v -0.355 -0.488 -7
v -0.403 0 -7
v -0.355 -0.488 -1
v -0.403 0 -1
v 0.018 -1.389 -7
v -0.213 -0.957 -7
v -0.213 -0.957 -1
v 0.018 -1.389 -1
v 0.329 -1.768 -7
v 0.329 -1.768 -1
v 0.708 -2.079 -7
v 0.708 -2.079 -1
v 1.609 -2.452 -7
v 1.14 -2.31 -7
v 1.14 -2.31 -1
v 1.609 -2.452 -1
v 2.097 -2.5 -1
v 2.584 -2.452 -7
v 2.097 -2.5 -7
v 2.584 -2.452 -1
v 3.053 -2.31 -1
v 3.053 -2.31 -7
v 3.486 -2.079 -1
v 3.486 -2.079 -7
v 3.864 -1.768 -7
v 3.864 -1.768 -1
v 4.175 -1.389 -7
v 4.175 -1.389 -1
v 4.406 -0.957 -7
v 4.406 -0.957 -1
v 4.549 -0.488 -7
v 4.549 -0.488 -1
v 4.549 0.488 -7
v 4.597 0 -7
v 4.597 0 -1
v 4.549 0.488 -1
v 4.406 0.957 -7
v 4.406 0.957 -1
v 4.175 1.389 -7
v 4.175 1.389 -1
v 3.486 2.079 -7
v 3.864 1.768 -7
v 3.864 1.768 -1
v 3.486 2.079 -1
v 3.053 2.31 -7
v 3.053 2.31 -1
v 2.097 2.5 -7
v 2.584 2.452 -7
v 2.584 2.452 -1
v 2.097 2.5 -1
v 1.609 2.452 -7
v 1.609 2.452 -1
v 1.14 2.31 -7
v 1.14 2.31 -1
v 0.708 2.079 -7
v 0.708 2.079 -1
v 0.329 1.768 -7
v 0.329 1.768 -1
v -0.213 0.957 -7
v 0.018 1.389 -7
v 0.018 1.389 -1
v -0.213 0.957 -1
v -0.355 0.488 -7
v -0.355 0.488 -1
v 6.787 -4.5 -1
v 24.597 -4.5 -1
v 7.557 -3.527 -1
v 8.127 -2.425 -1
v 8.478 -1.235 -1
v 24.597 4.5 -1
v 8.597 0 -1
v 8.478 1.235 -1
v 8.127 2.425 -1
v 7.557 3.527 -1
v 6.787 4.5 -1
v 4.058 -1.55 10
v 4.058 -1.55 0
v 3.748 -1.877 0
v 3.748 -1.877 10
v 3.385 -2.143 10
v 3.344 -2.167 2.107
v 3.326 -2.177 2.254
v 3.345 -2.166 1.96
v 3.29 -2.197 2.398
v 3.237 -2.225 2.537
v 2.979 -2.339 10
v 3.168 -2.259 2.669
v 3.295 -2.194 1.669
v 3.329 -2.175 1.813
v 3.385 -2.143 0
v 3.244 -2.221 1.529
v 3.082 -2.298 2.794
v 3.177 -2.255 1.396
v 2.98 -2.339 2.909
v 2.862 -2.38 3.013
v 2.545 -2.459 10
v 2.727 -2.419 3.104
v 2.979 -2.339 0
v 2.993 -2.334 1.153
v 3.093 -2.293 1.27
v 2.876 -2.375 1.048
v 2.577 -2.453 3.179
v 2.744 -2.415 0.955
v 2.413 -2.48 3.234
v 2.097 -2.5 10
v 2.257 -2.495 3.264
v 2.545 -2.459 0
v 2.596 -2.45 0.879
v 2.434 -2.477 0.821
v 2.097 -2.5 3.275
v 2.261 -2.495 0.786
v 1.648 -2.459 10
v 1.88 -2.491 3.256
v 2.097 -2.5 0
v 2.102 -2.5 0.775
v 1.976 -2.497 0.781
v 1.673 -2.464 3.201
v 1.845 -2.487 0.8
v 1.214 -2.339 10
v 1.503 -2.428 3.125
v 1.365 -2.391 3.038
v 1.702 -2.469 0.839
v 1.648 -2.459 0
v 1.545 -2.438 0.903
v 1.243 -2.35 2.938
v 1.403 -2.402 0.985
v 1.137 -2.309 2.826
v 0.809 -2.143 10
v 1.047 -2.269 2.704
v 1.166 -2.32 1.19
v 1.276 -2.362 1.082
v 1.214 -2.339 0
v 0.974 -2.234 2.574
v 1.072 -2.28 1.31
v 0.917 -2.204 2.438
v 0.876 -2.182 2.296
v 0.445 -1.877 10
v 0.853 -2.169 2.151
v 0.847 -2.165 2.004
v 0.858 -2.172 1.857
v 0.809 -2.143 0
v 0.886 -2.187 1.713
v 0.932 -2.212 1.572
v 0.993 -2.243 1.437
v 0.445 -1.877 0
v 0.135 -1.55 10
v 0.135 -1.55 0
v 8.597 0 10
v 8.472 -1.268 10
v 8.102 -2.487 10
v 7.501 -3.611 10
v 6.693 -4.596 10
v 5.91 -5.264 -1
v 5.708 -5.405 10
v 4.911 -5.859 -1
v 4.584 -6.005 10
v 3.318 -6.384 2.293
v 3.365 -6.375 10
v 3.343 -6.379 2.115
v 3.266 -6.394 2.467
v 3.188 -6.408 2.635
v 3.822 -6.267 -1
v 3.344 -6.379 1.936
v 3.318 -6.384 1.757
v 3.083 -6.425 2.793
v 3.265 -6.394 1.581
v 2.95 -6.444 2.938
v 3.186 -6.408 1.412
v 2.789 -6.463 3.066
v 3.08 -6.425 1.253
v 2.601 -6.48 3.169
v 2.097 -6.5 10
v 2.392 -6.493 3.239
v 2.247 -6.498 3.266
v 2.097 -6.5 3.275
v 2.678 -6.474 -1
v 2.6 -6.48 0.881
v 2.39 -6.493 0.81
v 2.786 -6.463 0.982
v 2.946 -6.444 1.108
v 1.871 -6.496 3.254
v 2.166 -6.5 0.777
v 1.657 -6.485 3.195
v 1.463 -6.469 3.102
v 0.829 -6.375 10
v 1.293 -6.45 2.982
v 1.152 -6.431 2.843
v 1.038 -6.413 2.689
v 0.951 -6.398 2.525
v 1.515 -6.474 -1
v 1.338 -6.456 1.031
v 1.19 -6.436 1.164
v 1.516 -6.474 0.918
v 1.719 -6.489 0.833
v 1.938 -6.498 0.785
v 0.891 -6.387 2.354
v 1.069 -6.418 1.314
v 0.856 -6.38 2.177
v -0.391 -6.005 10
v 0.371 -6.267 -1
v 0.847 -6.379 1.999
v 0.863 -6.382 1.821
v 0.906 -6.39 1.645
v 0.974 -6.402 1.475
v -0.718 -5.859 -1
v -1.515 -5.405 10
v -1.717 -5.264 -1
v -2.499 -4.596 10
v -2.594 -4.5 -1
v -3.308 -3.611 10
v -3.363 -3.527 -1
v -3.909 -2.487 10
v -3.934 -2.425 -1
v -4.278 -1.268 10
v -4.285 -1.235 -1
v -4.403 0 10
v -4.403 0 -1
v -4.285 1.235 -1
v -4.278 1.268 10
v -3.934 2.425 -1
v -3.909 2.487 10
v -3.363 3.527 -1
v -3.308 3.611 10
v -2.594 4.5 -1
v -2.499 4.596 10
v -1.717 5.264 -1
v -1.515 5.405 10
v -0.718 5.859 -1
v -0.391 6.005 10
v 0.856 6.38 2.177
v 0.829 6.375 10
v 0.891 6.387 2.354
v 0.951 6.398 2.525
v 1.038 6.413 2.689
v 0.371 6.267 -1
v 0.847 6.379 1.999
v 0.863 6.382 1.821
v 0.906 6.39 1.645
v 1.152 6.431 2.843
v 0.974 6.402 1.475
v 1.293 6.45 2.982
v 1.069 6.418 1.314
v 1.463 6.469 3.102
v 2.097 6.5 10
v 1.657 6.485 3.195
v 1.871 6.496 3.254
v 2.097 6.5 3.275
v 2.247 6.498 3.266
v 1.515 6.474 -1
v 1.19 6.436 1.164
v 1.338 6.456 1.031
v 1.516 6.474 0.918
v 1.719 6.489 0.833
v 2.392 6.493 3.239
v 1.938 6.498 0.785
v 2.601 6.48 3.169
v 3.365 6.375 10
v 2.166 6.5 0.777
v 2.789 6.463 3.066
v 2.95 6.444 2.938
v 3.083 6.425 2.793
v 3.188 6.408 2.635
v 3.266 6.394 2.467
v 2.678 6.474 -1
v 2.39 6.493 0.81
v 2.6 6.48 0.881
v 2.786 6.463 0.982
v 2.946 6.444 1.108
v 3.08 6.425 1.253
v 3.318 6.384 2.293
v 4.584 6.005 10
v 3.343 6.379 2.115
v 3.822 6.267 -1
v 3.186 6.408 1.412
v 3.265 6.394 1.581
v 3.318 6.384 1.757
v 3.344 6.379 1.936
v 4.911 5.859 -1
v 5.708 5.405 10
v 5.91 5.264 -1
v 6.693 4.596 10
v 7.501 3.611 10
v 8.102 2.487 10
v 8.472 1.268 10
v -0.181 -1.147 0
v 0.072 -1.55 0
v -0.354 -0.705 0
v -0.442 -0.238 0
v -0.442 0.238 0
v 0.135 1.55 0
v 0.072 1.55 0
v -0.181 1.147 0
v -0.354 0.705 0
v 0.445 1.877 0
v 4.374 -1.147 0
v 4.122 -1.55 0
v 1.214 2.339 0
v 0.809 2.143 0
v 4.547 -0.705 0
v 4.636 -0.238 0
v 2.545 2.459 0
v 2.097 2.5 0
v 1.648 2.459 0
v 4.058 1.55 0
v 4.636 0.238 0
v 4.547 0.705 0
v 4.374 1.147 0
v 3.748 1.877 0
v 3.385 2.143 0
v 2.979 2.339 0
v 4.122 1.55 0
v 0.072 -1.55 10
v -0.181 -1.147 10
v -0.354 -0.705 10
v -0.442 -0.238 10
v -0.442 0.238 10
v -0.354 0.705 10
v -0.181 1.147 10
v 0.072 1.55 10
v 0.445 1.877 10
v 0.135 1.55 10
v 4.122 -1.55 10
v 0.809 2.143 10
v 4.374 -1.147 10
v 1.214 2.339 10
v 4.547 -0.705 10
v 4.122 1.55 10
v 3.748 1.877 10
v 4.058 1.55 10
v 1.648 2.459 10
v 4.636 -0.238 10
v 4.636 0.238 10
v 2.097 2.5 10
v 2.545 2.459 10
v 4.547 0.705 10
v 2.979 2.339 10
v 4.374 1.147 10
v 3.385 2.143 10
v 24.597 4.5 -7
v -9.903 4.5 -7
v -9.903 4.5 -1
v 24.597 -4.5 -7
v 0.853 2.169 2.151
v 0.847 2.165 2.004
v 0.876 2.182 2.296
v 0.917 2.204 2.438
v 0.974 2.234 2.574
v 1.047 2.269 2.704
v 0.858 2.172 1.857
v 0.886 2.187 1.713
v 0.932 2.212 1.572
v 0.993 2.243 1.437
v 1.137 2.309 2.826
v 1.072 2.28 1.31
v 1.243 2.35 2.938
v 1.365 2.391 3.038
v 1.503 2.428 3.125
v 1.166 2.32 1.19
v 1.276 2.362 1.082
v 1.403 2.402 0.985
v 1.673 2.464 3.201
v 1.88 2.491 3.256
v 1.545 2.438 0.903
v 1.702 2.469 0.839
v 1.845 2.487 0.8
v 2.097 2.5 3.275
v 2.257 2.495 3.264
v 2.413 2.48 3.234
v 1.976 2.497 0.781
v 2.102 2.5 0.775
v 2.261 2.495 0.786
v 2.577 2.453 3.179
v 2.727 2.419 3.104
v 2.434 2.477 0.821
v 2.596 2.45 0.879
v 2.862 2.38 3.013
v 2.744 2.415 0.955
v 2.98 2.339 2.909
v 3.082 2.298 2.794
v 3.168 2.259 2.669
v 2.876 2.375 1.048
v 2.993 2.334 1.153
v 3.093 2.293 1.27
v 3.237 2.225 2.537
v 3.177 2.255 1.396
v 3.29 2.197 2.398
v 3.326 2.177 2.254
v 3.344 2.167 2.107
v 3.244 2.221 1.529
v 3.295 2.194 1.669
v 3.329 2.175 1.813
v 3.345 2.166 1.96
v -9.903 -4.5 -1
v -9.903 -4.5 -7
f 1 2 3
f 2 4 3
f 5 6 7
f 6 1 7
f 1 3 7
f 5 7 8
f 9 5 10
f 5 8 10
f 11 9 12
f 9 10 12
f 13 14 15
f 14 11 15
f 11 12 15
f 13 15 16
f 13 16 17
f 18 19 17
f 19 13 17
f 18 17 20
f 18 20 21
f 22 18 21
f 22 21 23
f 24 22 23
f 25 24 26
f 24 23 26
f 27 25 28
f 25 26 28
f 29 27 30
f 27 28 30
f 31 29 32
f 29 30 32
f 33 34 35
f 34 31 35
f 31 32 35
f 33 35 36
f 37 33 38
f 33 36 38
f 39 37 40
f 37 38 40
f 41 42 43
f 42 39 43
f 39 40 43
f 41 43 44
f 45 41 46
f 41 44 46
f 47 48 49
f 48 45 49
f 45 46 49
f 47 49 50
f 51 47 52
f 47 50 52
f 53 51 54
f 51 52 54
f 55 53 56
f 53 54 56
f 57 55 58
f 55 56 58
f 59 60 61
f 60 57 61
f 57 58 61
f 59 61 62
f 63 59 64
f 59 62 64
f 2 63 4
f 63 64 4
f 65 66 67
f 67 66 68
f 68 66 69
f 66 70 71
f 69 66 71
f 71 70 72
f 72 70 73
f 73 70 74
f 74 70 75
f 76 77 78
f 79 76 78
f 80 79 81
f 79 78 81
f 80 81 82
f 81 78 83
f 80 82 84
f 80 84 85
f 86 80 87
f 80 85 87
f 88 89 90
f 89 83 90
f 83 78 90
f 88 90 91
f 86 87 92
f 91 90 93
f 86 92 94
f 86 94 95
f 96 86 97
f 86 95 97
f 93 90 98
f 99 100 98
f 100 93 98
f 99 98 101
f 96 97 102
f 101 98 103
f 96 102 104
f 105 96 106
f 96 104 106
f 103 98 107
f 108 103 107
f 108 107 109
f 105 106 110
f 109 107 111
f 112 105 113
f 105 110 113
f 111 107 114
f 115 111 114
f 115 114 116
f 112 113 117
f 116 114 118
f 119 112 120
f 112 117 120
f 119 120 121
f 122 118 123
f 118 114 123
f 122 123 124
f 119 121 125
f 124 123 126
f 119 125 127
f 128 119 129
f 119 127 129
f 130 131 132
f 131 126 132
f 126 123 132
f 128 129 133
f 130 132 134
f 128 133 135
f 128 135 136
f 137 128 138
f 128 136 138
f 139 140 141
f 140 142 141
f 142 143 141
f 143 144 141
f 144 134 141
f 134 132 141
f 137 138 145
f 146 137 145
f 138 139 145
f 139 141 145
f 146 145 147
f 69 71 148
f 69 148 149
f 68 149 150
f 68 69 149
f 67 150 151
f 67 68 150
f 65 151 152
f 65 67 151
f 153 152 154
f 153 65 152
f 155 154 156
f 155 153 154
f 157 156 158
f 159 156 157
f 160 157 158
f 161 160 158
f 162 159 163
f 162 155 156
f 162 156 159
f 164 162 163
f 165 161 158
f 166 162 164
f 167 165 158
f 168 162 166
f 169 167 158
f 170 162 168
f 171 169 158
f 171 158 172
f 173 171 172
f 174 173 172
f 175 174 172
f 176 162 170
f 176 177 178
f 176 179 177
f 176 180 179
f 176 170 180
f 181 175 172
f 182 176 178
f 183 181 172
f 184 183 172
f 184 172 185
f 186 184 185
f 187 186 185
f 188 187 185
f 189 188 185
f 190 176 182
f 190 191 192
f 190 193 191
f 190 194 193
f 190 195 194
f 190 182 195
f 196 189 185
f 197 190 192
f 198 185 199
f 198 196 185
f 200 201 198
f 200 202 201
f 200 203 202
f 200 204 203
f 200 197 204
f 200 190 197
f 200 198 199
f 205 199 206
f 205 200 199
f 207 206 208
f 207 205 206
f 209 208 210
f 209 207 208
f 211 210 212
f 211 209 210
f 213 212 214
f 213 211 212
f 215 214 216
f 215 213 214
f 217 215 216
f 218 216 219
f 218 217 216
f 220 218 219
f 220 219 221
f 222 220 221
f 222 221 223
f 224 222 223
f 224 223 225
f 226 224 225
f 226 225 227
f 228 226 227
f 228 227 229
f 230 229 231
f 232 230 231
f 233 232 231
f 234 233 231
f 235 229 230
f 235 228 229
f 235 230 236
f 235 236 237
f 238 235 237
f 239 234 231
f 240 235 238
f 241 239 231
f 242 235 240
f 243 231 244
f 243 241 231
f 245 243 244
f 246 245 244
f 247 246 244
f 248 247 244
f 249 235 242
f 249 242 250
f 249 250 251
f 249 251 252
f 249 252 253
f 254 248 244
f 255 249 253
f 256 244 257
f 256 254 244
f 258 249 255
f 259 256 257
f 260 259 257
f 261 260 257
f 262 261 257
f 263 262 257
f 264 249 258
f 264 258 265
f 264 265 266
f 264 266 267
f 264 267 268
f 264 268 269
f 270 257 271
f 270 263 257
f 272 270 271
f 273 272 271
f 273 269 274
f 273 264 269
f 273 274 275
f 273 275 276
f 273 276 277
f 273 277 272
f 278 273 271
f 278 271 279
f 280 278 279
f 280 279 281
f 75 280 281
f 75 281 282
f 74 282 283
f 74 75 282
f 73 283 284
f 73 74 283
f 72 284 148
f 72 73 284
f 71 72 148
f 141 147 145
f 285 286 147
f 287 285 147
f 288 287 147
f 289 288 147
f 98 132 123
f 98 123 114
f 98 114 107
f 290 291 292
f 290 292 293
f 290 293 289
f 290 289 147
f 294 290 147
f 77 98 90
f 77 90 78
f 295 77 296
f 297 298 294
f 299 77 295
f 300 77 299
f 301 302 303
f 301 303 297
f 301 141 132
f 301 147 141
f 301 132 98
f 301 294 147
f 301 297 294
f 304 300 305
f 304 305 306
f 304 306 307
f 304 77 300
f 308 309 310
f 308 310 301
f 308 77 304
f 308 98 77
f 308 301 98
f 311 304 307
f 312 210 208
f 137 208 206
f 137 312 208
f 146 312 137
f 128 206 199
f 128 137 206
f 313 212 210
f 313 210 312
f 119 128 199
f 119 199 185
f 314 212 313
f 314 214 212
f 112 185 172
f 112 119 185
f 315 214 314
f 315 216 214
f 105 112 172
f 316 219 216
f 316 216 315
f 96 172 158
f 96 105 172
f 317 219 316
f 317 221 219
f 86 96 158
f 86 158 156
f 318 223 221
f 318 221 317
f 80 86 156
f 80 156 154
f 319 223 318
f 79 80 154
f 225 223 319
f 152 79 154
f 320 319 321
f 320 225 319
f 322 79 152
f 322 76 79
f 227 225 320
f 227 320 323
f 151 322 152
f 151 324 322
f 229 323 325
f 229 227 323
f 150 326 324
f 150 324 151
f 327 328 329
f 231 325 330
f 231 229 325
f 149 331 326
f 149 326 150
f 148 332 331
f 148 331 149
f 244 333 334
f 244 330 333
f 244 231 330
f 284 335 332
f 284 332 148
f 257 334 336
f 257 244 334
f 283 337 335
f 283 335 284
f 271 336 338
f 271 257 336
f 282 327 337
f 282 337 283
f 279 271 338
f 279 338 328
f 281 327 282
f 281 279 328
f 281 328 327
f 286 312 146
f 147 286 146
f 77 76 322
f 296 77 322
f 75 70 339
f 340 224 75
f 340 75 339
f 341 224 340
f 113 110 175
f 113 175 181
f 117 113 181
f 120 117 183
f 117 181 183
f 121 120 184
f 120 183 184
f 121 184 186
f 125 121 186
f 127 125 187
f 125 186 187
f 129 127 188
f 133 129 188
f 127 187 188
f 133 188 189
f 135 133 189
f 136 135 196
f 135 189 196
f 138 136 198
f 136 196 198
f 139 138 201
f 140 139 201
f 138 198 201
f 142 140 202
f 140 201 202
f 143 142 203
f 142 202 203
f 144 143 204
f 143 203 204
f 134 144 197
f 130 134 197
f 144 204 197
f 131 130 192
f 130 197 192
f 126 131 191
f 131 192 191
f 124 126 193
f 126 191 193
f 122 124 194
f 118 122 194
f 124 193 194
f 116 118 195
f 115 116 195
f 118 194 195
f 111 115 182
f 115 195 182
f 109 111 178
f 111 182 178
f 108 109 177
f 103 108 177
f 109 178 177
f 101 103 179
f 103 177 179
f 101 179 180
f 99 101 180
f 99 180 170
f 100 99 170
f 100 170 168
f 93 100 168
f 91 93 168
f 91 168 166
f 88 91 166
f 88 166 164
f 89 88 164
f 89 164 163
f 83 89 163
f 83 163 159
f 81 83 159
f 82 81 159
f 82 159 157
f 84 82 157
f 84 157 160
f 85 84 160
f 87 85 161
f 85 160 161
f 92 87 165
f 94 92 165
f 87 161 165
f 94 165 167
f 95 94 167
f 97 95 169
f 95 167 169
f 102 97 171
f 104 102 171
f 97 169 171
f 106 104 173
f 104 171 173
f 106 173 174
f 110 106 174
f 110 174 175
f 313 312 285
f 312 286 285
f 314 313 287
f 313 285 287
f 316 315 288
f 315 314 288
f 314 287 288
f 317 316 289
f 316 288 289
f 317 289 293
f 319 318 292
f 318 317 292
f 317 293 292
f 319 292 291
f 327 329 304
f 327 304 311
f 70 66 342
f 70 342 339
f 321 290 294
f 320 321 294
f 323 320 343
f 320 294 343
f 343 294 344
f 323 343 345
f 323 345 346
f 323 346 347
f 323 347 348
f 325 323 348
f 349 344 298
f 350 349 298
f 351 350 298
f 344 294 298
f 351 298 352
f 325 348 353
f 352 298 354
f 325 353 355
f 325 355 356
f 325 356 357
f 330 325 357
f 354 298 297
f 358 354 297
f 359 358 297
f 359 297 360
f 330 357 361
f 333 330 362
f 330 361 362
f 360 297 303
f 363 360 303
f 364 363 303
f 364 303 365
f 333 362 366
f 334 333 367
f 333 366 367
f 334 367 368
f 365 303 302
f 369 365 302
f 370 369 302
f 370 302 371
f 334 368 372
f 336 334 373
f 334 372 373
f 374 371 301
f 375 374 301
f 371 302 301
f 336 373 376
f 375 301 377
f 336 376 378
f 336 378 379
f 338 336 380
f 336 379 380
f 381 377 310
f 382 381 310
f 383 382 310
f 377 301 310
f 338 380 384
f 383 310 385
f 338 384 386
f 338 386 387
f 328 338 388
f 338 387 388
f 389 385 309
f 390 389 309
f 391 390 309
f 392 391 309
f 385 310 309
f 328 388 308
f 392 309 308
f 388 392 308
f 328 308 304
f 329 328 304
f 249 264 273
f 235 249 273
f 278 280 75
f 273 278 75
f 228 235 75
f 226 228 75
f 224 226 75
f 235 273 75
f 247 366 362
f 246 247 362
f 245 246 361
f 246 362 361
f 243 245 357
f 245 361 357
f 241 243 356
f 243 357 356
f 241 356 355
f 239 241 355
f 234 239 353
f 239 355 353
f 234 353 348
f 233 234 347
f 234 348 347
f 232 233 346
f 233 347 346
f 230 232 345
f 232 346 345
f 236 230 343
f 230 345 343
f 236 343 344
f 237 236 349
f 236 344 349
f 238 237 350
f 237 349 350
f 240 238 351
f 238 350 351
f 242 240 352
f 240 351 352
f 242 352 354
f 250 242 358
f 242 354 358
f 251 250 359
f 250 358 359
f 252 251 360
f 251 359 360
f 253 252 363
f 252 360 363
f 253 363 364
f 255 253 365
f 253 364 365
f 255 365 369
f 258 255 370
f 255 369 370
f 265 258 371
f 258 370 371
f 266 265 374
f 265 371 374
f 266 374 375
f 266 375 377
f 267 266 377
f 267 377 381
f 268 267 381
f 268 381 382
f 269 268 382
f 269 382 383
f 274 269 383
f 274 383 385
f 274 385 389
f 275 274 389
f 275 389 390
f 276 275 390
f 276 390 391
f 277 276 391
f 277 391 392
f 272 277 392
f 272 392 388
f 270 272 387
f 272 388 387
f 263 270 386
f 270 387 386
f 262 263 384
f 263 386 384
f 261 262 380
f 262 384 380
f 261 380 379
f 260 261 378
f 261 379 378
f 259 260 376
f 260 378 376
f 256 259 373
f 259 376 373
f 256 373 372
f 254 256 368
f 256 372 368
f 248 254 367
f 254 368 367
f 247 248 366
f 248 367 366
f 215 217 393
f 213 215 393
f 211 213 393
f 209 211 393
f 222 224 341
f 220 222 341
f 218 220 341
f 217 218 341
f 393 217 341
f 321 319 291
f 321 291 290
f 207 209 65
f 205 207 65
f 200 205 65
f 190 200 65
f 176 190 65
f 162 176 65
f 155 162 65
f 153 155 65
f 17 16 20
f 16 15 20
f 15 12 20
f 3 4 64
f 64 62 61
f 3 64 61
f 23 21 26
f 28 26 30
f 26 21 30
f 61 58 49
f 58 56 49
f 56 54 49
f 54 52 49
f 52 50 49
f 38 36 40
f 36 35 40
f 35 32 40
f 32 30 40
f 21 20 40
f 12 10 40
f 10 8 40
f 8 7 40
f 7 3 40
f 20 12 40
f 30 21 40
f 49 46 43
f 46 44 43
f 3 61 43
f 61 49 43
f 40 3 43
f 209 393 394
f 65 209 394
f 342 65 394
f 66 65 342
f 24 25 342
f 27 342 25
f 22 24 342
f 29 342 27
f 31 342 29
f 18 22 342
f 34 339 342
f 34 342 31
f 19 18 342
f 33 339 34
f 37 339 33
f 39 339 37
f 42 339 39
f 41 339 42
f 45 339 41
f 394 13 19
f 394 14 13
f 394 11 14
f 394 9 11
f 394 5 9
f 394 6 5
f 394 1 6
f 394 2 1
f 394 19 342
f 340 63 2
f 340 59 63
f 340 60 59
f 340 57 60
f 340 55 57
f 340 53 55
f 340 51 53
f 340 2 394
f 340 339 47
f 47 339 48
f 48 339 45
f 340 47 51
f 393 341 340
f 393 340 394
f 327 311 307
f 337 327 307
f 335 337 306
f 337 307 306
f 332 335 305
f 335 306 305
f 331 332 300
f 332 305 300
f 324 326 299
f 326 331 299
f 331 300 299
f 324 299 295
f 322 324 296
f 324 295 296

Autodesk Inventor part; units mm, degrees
ref_plane "YZ Plane" through (0, 0, 0) normal (1, 0, 0) x (0, 1, 0)
ref_plane "XZ Plane" through (0, 0, 0) normal (0, 1, 0) x (-1, 0, 0)
sketch "Sketch1" plane through (0, 0, 0) normal (0, 0, 1) x (1, 0, 0)
  line L0 (0.8467, -0.7217) -> (0.8467, 0.7217) construction
  line L1 (0.8467, 0.7217) -> (2.0967, 1.4434) construction
  line L2 (2.0967, 1.4434) -> (3.3467, 0.7217) construction
  line L3 (3.3467, 0.7217) -> (3.3467, -0.7217) construction
  line L4 (3.3467, -0.7217) -> (2.0967, -1.4434) construction
  line L5 (2.0967, -1.4434) -> (0.8467, -0.7217) construction
  circle A0 centre (2.0967, 0) radius 2.45 construction
  line L6 (4.8467, -1.5877) -> (3.4717, -2.3816) construction
  line L7 (15.0967, 3) -> (15.0967, -3) construction
  line L8 (-10.9033, 3) -> (-10.9033, -3) construction
  line L9 (-0.6533, 0) -> (-0.6533, 1.5877) construction
  circle A1 centre (2.0967, 0) radius 5
  circle A2 centre (2.0967, 0) radius 1.7 projected
  line L10 (-10.9033, -3) -> (15.0967, -3) projected
  line L11 (-10.9033, 3) -> (15.0967, 3) projected
  circle A3 centre (2.0967, 0) radius 3.5
  circle A4 centre (2.0967, 0) radius 6.5
  point P0 (0.4719, -0.5)
  point P1 (3.7215, -0.5)
  dimension "d10" = 7
  dimension "d13" = 13
ref_plane "Work Plane1" through (-20.8033, -6.3, -5.9) normal (0, 0, 1) x (1, 0, 0)
extrude "Extrusion1" add sketch "Sketch1" against normal blind 1 contours A1 L10 A3 L11 | A1 L11 A4 L10 | L11 A3 A1 | A1 L11 A4 | L10 A4 A1 | A1 L10 A3 | L11 A3 L10 A1 | A1 L10 A4 L11 | A3 L10 L11 | L11 A3 | A3 L10 | A2
sketch "Sketch2" plane through (2.0967, 0, 0) normal (0, 0, 1) x (1, 0, 0)
  line L0 (-2, 1.5) -> (2, 1.5) construction
  arc A0 (2.5, 0) -> (2, 1.5) centre (0, 0) ccw construction
  arc A1 (-2, 1.5) -> (-2.5, 0) centre (0, 0) ccw construction
  line L1 (2, -1.5) -> (-2, -1.5) construction
  arc A2 (-2.5, 0) -> (2.5, 0) centre (0, 0) ccw construction
  line L2 (2.0248, 1.55) -> (-2.0248, 1.55) construction
  arc A3 (-2.0248, 1.55) -> (-2.55, 0) centre (0, 0) ccw construction
  arc A4 (-2.55, 0) -> (2.55, 0) centre (0, 0) ccw construction
  arc A5 (2.55, 0) -> (2.0248, 1.55) centre (0, 0) ccw construction
  line L3 (-2.0248, 1.55) -> (2.0248, 1.55) construction
  line L4 (-2.0248, 1.55) -> (2.0248, 1.55)
  line L5 (-2.0248, -1.55) -> (2.0248, -1.55)
  arc A6 (-2.0248, 1.55) -> (-2.0248, -1.55) centre (0, 0) ccw
  arc A7 (2.0248, -1.55) -> (2.0248, 1.55) centre (0, 0) ccw
  circle A8 centre (0, 0) radius 6.5 projected
  circle A9 centre (0, 0) radius 2.5 projected
  point P0 (-2.0967, 0)
  point P1 (-1.9615, 1.55)
  point P2 (1.9615, 1.55)
  point P3 (1.9615, -1.55)
  point P4 (-1.9615, -1.55)
  dimension "d11" = 3.1
  dimension "d12" = 2.55
extrude "Extrusion2" add sketch "Sketch2" along normal blind 10
sketch "Sketch4" plane through (0.0718, -1.55, 0) normal (0, 1, 0) x (1, 0, 0)
  line L0 (0, -8.8) -> (4.0497, -8.8) projected
  line L1 (-4.4752, -10) -> (8.5248, -10) projected
  line L2 (8.5248, 1) -> (-4.4752, 1) projected
  line L3 (0, 0) -> (0.0633, 0) projected
  circle A0 centre (2.0248, -2.0248) radius 2.0248
  line L4 (3.9864, 0) -> (4.0497, 0) projected
  line L5 (3.9864, 0) -> (3.9864, -10) projected
  line L6 (4.0497, -10) -> (3.9864, -10) projected
  line L7 (4.0497, 0) -> (4.0497, -10) projected
  line L8 (0, 0) -> (0, -10) projected
  line L9 (0.0633, -10) -> (0, -10) projected
  line L10 (0.0633, 0) -> (0.0633, -10) projected
  point P0 (-0.0718, 0)
hole "Hole1" at (2.0967, -1.55, 2.0248) direction (0, -1, 0) diameter 2.5 end through all both
sketch "Skizze5" plane through (2.0967, 0, -1) normal (0, 0, -1) x (-1, 0, 0)
  circle A0 centre (0, 0) radius 6.5 projected
  line L0 (22.5, -4.5) -> (-22.5, -4.5)
  line L1 (-22.5, -4.5) -> (-22.5, 4.5)
  line L2 (-22.5, 4.5) -> (22.5, 4.5)
  line L3 (22.5, 4.5) -> (22.5, -4.5)
  line L4 (22.5, -4.5) -> (-22.5, 4.5) construction
  line L5 (-22.5, -4.5) -> (22.5, 4.5) construction
  circle A1 centre (0, 0) radius 2.5 projected
  line L6 (12, 4.5) -> (12, -4.5)
  point P0 (2.0967, 0)
  dimension "d28" = 45
  dimension "d34" = 9
  dimension "d35" = 12
extrude "Extrusion4" add sketch "Skizze5" along normal blind 6 contours A0 L0 L2 | A0 L2 L6 L0 | A0 L0 L1 L2
properties part number "55_spiralxy_motormount_NEMA_MGN7"
